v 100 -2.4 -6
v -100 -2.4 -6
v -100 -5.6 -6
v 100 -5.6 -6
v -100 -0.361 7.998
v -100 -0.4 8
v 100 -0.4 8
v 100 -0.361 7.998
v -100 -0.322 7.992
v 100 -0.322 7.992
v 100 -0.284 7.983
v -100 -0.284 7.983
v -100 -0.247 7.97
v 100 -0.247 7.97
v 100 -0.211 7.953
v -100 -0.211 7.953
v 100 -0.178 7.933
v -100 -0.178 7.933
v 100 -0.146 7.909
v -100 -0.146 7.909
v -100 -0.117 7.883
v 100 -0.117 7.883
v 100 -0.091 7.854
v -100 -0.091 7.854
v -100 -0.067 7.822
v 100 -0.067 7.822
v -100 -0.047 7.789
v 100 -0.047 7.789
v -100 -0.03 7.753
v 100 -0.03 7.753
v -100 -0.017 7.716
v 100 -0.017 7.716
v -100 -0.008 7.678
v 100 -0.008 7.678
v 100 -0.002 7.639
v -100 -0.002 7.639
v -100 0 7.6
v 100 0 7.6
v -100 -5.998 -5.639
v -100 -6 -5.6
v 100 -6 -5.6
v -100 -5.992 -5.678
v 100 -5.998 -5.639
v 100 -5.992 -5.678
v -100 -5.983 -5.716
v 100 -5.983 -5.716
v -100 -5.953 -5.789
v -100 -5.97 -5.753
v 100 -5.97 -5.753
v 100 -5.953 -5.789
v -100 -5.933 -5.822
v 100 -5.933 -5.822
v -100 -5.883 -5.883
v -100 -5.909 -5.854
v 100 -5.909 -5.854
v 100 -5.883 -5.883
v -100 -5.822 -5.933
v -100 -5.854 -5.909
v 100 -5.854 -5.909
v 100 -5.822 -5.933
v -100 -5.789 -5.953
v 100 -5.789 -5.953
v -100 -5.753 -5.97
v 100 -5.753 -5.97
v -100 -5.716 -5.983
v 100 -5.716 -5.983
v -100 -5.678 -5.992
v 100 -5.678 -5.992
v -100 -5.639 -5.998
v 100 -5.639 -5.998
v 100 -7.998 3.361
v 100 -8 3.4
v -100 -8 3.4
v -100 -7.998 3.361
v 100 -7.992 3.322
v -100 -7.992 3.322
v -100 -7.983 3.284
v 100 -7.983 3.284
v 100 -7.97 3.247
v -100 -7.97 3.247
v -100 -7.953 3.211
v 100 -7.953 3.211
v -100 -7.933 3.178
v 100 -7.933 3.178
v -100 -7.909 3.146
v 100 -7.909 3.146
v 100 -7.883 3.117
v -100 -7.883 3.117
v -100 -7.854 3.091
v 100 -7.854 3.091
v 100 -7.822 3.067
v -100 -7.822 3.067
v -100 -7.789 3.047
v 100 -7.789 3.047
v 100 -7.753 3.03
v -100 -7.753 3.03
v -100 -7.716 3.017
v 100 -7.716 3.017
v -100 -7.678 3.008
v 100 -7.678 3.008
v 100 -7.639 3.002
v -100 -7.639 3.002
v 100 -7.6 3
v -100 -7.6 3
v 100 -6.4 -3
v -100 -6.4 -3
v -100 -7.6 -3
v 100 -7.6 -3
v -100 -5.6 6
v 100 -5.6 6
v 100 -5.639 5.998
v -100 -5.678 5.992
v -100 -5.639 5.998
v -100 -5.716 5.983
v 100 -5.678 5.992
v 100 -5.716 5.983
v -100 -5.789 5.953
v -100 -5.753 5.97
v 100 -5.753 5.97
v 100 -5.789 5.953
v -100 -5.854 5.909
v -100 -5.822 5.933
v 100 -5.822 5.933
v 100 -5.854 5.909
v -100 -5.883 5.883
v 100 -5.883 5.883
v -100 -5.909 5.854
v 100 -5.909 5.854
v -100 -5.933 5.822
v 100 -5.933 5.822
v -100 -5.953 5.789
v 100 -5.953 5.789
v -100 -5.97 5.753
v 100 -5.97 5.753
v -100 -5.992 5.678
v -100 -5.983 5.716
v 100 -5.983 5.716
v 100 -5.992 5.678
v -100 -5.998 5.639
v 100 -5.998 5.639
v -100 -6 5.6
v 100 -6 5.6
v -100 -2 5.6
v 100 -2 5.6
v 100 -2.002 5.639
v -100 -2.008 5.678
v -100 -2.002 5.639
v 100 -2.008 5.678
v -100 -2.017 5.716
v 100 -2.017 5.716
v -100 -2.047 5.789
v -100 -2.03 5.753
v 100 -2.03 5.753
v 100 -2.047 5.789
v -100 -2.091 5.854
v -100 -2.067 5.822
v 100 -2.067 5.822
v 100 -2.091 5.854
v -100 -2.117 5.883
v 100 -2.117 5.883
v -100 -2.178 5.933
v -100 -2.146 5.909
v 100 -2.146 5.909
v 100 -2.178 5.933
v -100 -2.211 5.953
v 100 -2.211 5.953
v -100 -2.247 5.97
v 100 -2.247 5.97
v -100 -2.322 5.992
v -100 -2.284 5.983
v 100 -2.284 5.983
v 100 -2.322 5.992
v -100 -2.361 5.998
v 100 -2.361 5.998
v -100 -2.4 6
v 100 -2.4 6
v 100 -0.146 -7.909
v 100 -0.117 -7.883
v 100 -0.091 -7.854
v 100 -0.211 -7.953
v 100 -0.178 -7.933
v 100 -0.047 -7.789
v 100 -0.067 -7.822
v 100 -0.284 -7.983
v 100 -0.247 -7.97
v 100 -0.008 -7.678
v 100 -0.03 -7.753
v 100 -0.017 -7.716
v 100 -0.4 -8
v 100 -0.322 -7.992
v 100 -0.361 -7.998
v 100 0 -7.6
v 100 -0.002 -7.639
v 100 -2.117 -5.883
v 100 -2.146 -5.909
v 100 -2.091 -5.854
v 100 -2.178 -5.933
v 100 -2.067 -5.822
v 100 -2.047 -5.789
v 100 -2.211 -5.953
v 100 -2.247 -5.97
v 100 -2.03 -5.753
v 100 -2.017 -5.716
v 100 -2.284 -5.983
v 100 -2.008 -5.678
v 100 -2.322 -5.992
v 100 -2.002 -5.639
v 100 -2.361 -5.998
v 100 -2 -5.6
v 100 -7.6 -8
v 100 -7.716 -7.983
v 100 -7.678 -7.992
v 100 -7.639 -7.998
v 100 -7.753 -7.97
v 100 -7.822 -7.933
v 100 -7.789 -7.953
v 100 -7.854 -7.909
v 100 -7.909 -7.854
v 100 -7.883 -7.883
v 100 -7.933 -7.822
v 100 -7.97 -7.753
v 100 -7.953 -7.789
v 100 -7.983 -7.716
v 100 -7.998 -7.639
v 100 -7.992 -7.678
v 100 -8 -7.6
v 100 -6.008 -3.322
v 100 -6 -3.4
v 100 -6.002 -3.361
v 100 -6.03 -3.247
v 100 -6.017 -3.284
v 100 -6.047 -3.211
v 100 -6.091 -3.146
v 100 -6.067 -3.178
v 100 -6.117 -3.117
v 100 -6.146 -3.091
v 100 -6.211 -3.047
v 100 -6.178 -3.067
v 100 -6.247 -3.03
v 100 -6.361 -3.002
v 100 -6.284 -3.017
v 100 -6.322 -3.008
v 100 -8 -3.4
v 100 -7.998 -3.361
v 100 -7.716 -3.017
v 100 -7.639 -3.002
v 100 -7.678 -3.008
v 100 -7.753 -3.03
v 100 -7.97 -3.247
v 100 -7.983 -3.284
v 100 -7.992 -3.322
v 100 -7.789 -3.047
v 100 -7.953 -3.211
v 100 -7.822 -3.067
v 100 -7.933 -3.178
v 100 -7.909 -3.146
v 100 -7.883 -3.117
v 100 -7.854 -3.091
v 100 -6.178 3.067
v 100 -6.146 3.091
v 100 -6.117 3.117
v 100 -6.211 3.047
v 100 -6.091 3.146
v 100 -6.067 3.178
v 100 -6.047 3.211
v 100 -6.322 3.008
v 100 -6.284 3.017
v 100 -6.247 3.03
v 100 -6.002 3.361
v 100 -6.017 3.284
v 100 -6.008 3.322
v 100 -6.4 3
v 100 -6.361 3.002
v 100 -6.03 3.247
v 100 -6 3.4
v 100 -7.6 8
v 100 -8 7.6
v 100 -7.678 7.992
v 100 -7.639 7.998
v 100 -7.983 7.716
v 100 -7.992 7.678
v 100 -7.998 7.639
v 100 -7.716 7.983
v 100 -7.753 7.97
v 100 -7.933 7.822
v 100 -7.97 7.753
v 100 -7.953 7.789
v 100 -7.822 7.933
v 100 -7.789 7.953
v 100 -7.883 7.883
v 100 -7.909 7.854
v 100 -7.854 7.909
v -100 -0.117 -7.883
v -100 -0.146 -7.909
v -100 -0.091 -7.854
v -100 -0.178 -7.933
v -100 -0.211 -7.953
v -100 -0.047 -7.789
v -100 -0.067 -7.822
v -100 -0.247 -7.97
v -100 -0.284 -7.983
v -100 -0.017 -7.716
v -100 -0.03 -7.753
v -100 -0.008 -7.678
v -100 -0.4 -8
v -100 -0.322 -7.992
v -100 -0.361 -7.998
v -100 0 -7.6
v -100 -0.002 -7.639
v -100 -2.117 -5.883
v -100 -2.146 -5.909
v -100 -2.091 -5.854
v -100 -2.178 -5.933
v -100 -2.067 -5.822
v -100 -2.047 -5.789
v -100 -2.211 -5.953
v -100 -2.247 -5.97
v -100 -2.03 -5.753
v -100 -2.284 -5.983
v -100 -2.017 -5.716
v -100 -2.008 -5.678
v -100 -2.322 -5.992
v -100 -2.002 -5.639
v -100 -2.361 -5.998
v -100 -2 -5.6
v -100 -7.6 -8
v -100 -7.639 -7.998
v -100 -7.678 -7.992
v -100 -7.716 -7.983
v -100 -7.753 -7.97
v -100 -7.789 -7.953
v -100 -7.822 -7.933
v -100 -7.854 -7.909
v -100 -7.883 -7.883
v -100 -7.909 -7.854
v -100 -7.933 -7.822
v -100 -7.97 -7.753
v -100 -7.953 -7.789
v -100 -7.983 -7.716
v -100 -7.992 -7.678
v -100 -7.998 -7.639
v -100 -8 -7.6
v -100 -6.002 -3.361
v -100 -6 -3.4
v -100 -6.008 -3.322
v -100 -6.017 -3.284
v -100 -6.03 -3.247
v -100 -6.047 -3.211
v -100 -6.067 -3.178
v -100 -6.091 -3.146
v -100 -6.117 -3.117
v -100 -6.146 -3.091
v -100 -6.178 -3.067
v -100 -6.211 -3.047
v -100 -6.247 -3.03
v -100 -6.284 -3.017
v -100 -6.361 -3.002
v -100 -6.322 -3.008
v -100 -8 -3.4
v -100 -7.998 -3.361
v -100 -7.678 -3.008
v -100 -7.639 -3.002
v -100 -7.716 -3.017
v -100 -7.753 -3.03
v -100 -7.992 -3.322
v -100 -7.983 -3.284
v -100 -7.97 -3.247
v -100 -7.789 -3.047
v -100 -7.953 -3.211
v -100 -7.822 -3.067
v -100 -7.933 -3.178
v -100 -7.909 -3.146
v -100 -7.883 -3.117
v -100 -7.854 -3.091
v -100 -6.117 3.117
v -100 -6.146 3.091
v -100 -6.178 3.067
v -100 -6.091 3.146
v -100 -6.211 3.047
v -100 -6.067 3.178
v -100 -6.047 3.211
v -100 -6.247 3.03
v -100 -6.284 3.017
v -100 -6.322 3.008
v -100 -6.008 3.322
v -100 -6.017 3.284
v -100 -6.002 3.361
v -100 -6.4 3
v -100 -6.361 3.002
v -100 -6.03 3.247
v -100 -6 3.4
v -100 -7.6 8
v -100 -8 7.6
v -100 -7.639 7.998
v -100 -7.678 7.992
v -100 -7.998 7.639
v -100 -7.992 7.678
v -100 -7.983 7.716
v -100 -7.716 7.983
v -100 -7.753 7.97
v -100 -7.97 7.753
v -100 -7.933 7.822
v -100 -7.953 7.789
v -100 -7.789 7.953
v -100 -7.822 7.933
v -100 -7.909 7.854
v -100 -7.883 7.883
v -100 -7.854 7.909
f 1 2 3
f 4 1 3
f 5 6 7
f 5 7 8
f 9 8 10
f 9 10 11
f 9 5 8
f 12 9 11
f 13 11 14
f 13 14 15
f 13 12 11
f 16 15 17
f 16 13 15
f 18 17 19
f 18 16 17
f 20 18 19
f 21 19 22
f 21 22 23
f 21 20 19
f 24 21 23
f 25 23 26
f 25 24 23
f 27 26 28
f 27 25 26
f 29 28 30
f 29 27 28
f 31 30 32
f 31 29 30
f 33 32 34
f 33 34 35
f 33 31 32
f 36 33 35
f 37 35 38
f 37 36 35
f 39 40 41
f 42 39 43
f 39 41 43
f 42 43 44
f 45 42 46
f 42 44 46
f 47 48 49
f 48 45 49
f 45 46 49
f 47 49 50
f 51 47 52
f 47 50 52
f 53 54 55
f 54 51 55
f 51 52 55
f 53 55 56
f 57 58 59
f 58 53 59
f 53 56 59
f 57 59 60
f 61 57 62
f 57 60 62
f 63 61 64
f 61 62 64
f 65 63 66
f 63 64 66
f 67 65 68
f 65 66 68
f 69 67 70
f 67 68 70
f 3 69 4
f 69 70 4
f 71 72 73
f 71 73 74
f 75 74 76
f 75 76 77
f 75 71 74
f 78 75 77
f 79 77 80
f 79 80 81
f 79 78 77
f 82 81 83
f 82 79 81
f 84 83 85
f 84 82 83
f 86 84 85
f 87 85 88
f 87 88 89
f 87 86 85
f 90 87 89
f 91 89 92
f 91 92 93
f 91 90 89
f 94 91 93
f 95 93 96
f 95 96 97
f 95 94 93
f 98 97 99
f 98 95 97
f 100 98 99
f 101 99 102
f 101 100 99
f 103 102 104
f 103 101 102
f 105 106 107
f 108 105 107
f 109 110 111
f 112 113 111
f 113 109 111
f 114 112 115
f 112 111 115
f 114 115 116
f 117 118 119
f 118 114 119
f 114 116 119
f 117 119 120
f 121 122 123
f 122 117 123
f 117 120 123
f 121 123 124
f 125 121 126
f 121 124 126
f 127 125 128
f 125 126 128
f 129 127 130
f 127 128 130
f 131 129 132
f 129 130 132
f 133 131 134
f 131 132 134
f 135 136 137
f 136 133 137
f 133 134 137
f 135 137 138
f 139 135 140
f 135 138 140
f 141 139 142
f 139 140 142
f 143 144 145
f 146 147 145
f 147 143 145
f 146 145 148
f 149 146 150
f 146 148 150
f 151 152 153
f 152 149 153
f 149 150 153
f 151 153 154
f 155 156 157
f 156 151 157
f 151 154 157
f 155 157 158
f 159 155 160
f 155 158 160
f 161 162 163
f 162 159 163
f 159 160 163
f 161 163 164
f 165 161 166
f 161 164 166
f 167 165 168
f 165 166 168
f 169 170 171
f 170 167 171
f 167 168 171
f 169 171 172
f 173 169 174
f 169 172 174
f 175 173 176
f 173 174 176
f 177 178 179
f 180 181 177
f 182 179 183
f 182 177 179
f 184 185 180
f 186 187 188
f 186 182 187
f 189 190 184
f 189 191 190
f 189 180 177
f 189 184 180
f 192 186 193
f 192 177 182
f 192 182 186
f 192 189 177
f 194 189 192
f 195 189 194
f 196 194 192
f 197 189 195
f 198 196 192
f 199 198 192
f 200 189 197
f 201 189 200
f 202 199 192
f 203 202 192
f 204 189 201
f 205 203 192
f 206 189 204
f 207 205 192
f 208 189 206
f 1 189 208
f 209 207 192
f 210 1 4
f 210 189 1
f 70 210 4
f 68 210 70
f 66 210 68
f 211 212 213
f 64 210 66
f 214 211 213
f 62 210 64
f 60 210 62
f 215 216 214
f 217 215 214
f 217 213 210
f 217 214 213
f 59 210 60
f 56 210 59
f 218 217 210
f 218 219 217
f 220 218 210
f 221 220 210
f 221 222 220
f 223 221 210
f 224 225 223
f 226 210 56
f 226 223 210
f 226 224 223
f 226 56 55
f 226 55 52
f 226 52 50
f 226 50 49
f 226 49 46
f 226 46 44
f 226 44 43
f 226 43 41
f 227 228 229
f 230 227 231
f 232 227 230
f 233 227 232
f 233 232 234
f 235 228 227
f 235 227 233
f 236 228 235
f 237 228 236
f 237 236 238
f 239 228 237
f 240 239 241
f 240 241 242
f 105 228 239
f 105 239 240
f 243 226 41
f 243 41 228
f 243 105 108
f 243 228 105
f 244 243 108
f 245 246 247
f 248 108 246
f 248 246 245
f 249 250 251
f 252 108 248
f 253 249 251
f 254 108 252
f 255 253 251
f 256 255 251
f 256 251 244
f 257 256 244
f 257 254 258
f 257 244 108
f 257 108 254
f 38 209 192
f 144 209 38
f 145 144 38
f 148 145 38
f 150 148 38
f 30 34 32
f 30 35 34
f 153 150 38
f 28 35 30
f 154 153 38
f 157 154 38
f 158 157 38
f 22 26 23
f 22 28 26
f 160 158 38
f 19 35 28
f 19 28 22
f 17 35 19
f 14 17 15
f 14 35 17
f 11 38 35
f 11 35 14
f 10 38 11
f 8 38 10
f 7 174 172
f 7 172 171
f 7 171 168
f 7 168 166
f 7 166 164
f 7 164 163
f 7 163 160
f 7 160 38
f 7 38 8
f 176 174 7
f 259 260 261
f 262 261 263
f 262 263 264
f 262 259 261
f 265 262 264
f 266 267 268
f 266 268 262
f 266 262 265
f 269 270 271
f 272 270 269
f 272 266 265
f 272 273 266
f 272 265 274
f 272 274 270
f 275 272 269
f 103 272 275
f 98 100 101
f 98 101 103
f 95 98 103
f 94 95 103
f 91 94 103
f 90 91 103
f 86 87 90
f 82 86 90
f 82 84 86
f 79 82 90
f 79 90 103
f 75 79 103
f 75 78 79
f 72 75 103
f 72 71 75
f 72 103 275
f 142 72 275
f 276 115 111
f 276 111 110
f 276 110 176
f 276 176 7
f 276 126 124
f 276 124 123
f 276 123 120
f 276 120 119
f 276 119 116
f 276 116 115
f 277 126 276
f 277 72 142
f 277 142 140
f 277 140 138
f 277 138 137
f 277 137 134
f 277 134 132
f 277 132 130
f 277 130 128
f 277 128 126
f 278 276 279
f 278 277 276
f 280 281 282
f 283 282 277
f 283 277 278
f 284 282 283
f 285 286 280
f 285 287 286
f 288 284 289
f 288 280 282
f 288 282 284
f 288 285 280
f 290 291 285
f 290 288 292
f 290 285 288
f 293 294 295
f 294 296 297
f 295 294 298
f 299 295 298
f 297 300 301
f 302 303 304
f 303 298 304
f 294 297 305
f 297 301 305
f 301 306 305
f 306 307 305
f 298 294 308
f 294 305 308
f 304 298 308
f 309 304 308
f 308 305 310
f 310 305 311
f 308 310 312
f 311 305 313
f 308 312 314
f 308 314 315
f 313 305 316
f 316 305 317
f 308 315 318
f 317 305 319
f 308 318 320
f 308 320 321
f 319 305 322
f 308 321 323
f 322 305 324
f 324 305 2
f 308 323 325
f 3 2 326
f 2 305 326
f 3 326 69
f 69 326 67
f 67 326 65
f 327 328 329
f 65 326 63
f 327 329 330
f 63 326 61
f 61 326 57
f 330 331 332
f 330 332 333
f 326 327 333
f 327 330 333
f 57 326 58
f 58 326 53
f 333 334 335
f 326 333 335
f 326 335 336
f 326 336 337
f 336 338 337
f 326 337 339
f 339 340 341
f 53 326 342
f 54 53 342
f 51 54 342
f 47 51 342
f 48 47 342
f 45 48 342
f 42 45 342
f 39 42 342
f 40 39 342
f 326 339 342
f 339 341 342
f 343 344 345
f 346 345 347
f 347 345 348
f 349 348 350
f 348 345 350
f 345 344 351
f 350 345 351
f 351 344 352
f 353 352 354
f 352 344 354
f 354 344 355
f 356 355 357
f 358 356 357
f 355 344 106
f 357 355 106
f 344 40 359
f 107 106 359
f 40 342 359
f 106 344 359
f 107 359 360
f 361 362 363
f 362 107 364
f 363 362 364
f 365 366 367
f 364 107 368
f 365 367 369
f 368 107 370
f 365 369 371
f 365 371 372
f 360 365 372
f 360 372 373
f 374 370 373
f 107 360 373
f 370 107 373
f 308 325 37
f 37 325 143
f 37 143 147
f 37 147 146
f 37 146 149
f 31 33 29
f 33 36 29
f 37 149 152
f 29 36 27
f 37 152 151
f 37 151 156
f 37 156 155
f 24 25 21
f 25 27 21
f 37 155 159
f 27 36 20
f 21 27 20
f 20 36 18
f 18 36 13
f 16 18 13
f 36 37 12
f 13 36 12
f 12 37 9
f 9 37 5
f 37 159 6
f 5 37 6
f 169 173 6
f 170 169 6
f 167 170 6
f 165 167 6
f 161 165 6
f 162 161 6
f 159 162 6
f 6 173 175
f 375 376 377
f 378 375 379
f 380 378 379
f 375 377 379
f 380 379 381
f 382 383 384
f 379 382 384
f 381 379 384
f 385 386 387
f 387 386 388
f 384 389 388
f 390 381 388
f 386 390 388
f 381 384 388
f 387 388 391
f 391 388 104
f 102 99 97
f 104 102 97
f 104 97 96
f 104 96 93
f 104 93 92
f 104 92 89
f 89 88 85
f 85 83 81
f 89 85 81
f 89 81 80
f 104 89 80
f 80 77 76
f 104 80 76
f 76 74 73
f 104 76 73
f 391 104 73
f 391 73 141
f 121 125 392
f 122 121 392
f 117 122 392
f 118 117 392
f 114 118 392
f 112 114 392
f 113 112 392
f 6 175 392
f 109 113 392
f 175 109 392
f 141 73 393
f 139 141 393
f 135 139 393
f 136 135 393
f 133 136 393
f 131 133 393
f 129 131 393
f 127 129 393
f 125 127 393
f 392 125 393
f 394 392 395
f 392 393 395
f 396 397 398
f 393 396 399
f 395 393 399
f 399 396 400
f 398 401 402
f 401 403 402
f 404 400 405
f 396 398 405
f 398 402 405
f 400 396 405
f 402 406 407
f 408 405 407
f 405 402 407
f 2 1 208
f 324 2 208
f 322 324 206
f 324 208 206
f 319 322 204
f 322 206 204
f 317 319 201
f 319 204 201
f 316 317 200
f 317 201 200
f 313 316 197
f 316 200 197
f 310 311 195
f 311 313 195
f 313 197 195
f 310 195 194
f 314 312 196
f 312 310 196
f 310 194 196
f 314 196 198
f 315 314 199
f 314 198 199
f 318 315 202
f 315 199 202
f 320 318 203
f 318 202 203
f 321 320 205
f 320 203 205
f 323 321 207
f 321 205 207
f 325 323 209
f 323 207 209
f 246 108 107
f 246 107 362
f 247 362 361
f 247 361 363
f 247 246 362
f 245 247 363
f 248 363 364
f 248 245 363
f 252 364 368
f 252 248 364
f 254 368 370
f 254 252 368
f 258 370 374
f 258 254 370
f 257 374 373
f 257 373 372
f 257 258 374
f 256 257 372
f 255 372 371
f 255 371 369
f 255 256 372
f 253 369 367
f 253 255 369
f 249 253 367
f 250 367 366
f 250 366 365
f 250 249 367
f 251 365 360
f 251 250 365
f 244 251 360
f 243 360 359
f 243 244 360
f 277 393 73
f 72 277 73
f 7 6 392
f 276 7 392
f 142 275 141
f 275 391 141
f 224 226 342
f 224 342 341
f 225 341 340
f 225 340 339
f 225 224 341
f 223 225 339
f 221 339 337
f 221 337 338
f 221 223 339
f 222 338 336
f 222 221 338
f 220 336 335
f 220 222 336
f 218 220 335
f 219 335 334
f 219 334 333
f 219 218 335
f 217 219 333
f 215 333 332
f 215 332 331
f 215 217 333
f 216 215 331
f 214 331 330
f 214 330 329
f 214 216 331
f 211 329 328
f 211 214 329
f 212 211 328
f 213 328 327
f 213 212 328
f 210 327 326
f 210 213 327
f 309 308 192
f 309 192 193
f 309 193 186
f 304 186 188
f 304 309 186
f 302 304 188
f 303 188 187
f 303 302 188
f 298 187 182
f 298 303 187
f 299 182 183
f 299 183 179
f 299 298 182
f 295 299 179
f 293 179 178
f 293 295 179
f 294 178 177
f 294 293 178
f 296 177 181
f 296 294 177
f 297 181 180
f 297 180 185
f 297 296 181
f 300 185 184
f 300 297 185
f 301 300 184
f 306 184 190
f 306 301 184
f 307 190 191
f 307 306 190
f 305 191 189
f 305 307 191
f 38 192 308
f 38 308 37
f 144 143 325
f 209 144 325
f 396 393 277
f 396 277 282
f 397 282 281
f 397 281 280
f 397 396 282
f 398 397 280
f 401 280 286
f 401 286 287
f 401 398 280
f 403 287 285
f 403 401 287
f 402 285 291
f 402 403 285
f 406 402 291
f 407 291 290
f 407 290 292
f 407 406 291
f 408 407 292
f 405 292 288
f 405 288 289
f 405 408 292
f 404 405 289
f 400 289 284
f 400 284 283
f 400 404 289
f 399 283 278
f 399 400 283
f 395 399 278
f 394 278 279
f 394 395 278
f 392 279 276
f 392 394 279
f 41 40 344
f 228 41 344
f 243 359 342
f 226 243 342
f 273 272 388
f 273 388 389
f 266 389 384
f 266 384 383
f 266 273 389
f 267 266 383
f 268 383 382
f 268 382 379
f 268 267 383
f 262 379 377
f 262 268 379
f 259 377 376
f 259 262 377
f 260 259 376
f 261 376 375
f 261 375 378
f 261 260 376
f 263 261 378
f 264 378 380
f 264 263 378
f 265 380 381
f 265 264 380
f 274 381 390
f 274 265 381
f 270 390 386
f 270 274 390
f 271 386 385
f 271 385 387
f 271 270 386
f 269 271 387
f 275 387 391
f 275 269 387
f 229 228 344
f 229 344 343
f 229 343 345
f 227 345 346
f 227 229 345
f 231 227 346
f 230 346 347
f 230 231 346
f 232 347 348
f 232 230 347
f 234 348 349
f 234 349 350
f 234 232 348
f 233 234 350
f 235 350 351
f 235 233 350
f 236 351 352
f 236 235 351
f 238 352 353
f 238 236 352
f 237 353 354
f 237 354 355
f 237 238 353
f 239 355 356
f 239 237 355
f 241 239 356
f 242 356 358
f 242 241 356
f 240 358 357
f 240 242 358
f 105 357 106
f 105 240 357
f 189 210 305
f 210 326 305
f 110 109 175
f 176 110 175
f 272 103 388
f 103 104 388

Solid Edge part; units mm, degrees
sketch "Sketch1" plane through (0, 0, 0) normal (1, 0, 0) x (0, 1, 0)
  line L0 (-8, 8) -> (-8, 3)
  line L1 (-8, 3) -> (-6, 3)
  line L2 (-6, 3) -> (-6, 6)
  line L3 (-6, 6) -> (-2, 6)
  line L4 (-2, 6) -> (-2, -6)
  line L5 (-2, -6) -> (-6, -6)
  line L6 (-6, -6) -> (-6, -3)
  line L7 (-6, -3) -> (-8, -3)
  line L8 (-8, -3) -> (-8, -8)
  line L9 (-8, -8) -> (0, -8)
  line L10 (0, -8) -> (0, 8)
  line L11 (0, 8) -> (-8, 8)
  dimension "D1" = 8
  dimension "D2" = 16
  dimension "D3" = 2
  dimension "D4" = 6
  dimension "D5" = 12
  dimension "D6" = 6
extrude "Protrusion1" add sketch "Sketch1" along normal mid plane 200
fillet "Round_1" radius 0.4 12 edges at (0, -8, 8) (0, 0, 8) (0, -8, 3) (0, -6, 3) (0, -6, 6) (0, -2, 6) (0, -2, -6) (0, -6, -6) (0, -6, -3) (0, -8, -3) (0, -8, -8) (0, 0, -8)
properties material "Stainless steel"
